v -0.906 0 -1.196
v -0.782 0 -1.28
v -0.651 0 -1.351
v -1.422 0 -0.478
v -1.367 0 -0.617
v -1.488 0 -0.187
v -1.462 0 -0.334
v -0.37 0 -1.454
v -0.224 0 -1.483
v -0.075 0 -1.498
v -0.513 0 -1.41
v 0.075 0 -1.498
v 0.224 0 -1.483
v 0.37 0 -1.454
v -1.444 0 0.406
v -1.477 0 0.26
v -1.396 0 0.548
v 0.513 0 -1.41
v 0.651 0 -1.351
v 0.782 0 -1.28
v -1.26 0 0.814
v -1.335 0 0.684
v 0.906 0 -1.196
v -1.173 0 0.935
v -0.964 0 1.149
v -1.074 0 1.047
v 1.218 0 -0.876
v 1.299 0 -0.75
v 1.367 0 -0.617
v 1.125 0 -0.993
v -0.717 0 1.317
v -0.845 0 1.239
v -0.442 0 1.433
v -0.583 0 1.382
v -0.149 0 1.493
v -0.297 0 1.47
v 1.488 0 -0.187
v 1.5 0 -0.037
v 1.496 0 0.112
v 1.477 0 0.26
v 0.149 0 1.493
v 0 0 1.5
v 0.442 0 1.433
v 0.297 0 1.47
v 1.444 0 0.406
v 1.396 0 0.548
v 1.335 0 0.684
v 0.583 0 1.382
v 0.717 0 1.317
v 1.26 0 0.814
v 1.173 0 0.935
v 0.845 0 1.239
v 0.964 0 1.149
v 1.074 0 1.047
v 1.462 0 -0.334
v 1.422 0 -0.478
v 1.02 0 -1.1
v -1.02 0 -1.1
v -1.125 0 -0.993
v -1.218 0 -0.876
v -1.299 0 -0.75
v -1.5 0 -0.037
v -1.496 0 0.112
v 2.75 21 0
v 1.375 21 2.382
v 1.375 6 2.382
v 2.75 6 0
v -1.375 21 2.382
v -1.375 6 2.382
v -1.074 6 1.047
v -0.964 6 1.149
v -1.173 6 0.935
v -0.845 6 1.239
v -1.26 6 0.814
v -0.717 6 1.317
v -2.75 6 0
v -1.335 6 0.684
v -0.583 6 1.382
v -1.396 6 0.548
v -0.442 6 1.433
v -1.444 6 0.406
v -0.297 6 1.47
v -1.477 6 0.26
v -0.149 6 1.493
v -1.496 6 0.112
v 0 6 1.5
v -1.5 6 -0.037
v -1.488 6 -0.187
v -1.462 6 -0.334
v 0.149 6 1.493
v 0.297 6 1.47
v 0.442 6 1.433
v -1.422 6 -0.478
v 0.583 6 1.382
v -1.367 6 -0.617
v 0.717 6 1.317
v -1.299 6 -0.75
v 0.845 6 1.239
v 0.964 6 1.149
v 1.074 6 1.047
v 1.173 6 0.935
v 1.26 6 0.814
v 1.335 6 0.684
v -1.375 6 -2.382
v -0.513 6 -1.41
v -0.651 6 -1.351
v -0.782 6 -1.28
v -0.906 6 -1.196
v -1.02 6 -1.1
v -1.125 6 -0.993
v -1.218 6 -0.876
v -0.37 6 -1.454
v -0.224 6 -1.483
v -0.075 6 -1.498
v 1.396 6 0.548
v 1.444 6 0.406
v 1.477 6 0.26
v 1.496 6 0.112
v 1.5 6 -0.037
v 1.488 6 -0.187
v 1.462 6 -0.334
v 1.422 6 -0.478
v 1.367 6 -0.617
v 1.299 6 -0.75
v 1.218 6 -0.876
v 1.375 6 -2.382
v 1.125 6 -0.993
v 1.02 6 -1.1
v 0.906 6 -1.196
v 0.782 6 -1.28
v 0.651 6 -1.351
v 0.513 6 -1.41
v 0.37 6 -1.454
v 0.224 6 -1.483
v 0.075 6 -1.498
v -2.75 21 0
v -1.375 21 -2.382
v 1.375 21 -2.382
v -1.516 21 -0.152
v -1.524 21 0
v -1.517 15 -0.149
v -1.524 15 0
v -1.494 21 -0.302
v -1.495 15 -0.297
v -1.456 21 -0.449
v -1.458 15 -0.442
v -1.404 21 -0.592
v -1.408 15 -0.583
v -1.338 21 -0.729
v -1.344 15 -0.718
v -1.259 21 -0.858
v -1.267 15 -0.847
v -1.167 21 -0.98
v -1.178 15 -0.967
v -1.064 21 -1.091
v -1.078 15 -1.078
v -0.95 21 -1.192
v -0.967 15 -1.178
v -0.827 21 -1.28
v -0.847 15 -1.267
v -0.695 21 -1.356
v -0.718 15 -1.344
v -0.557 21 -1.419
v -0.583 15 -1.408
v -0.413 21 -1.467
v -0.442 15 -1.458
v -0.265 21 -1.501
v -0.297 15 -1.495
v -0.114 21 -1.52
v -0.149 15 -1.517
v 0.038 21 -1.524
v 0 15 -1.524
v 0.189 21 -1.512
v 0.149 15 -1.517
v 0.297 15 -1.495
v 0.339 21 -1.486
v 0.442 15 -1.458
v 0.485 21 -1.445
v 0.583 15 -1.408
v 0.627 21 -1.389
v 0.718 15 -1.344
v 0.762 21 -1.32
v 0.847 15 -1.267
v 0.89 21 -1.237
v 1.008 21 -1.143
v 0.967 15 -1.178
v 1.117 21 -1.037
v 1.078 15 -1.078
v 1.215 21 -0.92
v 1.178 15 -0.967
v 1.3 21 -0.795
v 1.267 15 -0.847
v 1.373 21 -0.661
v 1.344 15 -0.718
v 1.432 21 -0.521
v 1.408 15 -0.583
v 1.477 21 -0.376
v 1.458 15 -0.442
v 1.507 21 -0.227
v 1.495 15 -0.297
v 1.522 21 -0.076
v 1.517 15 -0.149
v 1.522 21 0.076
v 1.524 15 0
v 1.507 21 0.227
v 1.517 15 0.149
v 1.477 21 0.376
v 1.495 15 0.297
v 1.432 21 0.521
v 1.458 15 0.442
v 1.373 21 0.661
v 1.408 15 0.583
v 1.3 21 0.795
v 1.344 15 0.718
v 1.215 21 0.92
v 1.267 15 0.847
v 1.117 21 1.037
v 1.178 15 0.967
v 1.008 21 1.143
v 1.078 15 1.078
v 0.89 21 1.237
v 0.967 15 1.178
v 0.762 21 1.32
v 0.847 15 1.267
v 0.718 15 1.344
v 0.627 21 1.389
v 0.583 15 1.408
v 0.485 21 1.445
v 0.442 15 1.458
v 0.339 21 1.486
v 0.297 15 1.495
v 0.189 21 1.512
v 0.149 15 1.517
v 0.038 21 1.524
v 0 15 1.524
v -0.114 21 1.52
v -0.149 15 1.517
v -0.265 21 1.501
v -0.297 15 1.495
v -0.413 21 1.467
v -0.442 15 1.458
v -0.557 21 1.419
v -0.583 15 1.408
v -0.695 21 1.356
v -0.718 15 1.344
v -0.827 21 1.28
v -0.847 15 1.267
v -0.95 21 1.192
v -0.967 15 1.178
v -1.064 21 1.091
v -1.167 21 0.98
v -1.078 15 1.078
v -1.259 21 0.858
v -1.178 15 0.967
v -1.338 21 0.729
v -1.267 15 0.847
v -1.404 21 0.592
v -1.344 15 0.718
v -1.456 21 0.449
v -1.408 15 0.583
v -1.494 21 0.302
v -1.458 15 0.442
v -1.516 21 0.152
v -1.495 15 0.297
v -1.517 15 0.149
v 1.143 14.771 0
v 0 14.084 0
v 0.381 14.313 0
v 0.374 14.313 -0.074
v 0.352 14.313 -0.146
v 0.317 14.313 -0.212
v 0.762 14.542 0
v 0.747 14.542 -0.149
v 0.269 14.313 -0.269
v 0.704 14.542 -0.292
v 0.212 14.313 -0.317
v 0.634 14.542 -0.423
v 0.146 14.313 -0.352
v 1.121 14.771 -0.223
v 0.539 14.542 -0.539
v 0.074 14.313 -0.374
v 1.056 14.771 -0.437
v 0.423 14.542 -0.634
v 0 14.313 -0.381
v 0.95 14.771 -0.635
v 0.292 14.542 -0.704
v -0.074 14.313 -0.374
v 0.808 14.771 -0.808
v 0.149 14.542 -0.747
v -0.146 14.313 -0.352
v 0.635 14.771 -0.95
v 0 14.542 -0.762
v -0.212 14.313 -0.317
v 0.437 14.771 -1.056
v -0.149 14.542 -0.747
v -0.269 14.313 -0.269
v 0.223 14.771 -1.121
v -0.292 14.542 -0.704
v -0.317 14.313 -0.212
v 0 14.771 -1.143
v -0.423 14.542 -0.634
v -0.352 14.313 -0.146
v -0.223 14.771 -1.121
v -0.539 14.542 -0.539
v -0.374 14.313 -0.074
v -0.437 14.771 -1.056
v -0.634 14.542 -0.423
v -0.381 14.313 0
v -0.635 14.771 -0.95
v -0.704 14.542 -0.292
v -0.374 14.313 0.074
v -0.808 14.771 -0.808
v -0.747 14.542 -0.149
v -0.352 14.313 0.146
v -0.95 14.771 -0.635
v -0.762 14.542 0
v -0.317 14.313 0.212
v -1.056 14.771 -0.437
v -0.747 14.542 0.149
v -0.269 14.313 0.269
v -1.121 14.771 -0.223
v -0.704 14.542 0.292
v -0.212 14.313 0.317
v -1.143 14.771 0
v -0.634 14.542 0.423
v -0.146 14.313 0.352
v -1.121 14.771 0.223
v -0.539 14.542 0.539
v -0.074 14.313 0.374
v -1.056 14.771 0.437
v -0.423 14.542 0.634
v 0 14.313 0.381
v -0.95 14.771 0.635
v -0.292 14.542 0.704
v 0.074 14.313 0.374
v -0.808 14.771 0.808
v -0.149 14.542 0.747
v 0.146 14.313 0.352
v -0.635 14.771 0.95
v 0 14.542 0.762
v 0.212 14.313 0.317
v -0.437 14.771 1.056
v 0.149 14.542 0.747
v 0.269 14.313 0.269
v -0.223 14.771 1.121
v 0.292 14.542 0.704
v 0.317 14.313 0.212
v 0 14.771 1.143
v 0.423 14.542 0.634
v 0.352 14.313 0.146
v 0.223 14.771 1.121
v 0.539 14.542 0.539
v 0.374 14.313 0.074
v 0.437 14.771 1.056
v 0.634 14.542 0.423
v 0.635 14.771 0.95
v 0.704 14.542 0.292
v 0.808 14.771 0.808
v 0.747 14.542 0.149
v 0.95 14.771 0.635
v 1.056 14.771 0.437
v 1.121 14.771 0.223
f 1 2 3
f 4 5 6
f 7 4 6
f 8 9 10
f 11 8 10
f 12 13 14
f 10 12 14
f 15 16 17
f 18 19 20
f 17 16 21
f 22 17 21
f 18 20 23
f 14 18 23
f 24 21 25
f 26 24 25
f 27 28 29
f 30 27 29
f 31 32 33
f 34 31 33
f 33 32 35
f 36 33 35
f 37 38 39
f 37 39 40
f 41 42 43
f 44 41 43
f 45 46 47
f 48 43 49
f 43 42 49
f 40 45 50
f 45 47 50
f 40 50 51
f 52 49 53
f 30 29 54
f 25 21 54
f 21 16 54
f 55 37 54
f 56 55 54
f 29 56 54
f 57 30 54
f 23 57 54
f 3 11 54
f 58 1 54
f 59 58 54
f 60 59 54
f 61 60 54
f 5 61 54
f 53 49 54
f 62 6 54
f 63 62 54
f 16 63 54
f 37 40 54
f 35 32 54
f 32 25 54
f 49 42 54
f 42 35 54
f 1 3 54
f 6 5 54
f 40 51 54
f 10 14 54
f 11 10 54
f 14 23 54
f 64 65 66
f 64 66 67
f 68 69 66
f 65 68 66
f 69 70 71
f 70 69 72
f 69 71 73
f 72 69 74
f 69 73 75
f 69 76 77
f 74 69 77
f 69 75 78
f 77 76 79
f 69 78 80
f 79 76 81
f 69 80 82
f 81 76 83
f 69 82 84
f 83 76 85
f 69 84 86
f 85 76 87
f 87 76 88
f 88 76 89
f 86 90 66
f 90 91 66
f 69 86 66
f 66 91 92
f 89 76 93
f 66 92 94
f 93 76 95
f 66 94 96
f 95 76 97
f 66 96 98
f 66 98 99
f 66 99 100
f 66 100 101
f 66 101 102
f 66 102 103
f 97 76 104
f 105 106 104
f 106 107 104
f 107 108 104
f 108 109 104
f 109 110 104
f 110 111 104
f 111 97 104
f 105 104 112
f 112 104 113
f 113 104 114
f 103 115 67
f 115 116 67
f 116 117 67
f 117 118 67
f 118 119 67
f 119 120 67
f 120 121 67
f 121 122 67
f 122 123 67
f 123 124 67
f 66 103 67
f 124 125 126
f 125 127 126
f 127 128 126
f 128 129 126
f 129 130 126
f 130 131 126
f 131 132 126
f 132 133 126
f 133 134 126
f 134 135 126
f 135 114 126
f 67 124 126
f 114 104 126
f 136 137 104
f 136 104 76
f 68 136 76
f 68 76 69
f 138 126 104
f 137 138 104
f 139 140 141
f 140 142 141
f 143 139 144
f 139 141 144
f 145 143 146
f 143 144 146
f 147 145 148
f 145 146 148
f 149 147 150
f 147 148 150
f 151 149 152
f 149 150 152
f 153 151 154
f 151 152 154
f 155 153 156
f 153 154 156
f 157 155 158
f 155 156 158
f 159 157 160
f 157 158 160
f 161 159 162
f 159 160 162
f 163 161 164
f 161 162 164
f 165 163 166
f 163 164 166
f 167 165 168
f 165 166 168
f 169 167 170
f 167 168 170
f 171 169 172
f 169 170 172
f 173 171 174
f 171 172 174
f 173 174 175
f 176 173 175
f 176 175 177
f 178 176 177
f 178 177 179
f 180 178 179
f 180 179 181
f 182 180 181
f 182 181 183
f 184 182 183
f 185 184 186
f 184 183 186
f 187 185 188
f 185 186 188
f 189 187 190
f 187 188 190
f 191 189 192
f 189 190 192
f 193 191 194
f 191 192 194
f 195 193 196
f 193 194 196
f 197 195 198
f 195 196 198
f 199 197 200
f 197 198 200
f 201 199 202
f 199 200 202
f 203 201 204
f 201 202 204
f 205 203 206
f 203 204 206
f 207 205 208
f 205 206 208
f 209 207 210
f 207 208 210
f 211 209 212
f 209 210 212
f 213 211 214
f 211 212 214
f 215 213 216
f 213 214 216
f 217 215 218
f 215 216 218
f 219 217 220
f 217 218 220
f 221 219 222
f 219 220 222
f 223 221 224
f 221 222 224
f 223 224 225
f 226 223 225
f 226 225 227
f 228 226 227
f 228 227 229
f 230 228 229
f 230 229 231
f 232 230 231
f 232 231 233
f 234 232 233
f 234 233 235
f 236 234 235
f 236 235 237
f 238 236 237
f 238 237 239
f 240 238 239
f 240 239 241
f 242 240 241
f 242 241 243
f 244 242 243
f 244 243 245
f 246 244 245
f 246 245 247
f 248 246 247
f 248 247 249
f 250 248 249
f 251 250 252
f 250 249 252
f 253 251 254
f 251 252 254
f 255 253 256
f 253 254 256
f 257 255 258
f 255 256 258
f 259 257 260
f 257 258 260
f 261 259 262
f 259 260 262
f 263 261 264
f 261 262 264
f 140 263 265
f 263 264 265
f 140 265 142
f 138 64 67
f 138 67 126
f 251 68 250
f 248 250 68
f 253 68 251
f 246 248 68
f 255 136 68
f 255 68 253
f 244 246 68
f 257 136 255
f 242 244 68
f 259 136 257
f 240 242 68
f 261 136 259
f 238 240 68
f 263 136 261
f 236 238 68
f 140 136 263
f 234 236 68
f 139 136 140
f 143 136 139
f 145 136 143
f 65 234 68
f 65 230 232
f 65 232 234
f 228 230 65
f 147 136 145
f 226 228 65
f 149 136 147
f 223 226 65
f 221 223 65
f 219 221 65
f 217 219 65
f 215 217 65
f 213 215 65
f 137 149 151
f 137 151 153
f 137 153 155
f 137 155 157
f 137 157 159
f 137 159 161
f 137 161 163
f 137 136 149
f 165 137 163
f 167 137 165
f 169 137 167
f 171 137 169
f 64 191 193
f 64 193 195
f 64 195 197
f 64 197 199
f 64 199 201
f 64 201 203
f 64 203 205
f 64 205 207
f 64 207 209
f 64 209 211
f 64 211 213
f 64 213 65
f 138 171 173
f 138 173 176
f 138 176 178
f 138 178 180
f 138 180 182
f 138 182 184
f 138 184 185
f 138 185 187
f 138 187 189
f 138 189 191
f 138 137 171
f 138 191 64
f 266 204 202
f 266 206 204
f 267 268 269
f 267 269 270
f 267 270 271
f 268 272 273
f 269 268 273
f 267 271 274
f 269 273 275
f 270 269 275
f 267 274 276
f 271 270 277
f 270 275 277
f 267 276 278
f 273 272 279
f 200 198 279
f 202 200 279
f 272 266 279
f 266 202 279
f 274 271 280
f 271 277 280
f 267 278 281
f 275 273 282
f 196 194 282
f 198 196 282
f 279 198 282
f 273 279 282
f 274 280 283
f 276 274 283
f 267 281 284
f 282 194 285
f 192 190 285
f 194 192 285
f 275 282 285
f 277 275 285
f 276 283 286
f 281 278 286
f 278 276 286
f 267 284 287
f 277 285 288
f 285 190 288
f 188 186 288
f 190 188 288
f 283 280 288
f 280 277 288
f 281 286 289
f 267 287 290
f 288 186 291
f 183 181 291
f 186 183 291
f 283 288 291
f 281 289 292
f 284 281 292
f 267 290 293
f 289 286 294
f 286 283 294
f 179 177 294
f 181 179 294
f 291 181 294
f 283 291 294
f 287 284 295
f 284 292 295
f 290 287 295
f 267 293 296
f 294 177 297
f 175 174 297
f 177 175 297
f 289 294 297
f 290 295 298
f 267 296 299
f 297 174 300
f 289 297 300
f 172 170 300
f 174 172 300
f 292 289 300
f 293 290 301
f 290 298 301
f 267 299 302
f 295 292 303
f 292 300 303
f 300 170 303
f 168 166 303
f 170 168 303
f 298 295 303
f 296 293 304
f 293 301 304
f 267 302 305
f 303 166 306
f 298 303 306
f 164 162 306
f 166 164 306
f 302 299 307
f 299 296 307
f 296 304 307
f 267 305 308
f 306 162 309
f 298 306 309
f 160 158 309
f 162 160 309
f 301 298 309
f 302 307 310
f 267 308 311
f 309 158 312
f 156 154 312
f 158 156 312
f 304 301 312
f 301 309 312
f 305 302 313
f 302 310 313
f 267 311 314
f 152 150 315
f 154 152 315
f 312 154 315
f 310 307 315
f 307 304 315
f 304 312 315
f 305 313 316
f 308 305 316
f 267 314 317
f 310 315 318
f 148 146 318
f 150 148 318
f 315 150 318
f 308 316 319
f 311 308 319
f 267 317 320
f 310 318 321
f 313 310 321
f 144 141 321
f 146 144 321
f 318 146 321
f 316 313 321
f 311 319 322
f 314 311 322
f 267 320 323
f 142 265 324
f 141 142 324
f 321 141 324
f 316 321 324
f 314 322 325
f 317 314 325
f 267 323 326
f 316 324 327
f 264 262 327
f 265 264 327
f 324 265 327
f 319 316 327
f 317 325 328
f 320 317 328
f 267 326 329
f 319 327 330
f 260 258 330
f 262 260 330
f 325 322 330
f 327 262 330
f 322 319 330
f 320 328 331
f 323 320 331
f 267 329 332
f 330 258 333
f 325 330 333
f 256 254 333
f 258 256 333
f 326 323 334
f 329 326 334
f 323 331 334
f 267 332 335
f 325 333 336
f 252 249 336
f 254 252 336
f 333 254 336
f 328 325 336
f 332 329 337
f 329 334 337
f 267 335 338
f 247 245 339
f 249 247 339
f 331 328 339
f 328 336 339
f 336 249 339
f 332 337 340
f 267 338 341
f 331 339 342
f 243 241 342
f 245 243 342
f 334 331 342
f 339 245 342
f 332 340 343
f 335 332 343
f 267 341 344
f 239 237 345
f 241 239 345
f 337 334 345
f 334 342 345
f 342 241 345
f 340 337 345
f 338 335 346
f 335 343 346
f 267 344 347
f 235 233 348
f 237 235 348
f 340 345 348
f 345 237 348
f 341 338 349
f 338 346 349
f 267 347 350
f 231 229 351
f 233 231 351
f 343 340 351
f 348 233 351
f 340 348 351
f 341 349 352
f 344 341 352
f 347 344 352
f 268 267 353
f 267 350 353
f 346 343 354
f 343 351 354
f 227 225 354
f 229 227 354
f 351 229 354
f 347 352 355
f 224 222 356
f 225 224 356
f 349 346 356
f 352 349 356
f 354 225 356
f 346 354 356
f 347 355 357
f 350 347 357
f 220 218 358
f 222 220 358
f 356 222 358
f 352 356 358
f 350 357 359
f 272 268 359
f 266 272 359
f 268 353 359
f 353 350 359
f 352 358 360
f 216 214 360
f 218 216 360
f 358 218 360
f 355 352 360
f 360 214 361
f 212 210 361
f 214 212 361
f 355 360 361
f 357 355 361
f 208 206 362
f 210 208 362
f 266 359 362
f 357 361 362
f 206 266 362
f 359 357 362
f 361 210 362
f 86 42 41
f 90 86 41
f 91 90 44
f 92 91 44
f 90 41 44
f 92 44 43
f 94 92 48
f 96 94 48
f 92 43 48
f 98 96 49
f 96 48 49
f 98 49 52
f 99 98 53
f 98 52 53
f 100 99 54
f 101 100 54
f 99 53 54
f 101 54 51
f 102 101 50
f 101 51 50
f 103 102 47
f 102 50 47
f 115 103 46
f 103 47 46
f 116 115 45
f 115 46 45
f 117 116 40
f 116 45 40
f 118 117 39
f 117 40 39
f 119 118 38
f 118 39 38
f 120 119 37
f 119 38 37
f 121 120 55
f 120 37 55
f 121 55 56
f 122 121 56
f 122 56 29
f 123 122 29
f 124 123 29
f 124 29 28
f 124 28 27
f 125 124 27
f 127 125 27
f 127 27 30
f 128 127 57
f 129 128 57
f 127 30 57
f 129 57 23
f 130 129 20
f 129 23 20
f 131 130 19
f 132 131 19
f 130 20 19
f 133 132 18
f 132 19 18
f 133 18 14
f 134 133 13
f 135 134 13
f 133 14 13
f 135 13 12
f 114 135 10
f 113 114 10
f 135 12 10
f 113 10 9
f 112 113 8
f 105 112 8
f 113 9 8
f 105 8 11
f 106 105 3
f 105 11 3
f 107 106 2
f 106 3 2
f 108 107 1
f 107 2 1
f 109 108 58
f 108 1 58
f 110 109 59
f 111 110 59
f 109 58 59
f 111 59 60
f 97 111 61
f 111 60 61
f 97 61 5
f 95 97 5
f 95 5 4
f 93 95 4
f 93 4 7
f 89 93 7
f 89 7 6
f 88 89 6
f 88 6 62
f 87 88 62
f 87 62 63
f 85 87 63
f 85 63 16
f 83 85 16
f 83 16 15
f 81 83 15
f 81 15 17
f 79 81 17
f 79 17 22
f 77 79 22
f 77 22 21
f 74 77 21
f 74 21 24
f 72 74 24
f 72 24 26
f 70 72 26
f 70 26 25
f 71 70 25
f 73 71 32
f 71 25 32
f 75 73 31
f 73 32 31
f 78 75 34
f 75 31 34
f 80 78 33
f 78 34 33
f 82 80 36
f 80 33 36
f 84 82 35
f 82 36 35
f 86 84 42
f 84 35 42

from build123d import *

# Parameters (mm, degrees)
SKETCH_1_R           = 1.5
EXTRUDE_1_DEPTH      = 6
EXTRUDE_2_DEPTH      = 15
HOLE_WIZARD_41_D     = 3.048
HOLE_WIZARD_41_DEPTH = 6
HOLE_WIZARD_41_TIP   = 0.915711583


with BuildPart() as part:
    # Эскиз1 → Бобышка-Вытянуть1 (new body)
    with BuildSketch(Plane(origin=(0, 0, 0), x_dir=(1, 0, 0), z_dir=(0, 1, 0))):
        with Locations(Location((0, 0, 0), (0, 0, 270))):
            Circle(SKETCH_1_R)
    extrude(amount=EXTRUDE_1_DEPTH)

    # Эскиз2 → Бобышка-Вытянуть2 (add)
    with BuildSketch(Plane(origin=(0, 6, 0), x_dir=(1, 0, 0), z_dir=(0, 1, 0))):
        Polygon((2.75, 0), (1.375, 2.38156986), (-1.375, 2.38156986), (-2.75, 0), (-1.375, -2.38156986), (1.375, -2.38156986), align=None)
    extrude(amount=EXTRUDE_2_DEPTH)

    # Сверло под метчик  спиральное #41
    with Locations(Plane(origin=(0, 21, 0), x_dir=(1, 0, 0), z_dir=(0, 1, 0))):
        with Locations((0, 0)):
            Hole(HOLE_WIZARD_41_D / 2, depth=HOLE_WIZARD_41_DEPTH)
            with Locations((0, 0, -(HOLE_WIZARD_41_DEPTH + HOLE_WIZARD_41_TIP / 2))):  # 118° drill point
                Cone(0, HOLE_WIZARD_41_D / 2, HOLE_WIZARD_41_TIP, mode=Mode.SUBTRACT)


solid = part.part
